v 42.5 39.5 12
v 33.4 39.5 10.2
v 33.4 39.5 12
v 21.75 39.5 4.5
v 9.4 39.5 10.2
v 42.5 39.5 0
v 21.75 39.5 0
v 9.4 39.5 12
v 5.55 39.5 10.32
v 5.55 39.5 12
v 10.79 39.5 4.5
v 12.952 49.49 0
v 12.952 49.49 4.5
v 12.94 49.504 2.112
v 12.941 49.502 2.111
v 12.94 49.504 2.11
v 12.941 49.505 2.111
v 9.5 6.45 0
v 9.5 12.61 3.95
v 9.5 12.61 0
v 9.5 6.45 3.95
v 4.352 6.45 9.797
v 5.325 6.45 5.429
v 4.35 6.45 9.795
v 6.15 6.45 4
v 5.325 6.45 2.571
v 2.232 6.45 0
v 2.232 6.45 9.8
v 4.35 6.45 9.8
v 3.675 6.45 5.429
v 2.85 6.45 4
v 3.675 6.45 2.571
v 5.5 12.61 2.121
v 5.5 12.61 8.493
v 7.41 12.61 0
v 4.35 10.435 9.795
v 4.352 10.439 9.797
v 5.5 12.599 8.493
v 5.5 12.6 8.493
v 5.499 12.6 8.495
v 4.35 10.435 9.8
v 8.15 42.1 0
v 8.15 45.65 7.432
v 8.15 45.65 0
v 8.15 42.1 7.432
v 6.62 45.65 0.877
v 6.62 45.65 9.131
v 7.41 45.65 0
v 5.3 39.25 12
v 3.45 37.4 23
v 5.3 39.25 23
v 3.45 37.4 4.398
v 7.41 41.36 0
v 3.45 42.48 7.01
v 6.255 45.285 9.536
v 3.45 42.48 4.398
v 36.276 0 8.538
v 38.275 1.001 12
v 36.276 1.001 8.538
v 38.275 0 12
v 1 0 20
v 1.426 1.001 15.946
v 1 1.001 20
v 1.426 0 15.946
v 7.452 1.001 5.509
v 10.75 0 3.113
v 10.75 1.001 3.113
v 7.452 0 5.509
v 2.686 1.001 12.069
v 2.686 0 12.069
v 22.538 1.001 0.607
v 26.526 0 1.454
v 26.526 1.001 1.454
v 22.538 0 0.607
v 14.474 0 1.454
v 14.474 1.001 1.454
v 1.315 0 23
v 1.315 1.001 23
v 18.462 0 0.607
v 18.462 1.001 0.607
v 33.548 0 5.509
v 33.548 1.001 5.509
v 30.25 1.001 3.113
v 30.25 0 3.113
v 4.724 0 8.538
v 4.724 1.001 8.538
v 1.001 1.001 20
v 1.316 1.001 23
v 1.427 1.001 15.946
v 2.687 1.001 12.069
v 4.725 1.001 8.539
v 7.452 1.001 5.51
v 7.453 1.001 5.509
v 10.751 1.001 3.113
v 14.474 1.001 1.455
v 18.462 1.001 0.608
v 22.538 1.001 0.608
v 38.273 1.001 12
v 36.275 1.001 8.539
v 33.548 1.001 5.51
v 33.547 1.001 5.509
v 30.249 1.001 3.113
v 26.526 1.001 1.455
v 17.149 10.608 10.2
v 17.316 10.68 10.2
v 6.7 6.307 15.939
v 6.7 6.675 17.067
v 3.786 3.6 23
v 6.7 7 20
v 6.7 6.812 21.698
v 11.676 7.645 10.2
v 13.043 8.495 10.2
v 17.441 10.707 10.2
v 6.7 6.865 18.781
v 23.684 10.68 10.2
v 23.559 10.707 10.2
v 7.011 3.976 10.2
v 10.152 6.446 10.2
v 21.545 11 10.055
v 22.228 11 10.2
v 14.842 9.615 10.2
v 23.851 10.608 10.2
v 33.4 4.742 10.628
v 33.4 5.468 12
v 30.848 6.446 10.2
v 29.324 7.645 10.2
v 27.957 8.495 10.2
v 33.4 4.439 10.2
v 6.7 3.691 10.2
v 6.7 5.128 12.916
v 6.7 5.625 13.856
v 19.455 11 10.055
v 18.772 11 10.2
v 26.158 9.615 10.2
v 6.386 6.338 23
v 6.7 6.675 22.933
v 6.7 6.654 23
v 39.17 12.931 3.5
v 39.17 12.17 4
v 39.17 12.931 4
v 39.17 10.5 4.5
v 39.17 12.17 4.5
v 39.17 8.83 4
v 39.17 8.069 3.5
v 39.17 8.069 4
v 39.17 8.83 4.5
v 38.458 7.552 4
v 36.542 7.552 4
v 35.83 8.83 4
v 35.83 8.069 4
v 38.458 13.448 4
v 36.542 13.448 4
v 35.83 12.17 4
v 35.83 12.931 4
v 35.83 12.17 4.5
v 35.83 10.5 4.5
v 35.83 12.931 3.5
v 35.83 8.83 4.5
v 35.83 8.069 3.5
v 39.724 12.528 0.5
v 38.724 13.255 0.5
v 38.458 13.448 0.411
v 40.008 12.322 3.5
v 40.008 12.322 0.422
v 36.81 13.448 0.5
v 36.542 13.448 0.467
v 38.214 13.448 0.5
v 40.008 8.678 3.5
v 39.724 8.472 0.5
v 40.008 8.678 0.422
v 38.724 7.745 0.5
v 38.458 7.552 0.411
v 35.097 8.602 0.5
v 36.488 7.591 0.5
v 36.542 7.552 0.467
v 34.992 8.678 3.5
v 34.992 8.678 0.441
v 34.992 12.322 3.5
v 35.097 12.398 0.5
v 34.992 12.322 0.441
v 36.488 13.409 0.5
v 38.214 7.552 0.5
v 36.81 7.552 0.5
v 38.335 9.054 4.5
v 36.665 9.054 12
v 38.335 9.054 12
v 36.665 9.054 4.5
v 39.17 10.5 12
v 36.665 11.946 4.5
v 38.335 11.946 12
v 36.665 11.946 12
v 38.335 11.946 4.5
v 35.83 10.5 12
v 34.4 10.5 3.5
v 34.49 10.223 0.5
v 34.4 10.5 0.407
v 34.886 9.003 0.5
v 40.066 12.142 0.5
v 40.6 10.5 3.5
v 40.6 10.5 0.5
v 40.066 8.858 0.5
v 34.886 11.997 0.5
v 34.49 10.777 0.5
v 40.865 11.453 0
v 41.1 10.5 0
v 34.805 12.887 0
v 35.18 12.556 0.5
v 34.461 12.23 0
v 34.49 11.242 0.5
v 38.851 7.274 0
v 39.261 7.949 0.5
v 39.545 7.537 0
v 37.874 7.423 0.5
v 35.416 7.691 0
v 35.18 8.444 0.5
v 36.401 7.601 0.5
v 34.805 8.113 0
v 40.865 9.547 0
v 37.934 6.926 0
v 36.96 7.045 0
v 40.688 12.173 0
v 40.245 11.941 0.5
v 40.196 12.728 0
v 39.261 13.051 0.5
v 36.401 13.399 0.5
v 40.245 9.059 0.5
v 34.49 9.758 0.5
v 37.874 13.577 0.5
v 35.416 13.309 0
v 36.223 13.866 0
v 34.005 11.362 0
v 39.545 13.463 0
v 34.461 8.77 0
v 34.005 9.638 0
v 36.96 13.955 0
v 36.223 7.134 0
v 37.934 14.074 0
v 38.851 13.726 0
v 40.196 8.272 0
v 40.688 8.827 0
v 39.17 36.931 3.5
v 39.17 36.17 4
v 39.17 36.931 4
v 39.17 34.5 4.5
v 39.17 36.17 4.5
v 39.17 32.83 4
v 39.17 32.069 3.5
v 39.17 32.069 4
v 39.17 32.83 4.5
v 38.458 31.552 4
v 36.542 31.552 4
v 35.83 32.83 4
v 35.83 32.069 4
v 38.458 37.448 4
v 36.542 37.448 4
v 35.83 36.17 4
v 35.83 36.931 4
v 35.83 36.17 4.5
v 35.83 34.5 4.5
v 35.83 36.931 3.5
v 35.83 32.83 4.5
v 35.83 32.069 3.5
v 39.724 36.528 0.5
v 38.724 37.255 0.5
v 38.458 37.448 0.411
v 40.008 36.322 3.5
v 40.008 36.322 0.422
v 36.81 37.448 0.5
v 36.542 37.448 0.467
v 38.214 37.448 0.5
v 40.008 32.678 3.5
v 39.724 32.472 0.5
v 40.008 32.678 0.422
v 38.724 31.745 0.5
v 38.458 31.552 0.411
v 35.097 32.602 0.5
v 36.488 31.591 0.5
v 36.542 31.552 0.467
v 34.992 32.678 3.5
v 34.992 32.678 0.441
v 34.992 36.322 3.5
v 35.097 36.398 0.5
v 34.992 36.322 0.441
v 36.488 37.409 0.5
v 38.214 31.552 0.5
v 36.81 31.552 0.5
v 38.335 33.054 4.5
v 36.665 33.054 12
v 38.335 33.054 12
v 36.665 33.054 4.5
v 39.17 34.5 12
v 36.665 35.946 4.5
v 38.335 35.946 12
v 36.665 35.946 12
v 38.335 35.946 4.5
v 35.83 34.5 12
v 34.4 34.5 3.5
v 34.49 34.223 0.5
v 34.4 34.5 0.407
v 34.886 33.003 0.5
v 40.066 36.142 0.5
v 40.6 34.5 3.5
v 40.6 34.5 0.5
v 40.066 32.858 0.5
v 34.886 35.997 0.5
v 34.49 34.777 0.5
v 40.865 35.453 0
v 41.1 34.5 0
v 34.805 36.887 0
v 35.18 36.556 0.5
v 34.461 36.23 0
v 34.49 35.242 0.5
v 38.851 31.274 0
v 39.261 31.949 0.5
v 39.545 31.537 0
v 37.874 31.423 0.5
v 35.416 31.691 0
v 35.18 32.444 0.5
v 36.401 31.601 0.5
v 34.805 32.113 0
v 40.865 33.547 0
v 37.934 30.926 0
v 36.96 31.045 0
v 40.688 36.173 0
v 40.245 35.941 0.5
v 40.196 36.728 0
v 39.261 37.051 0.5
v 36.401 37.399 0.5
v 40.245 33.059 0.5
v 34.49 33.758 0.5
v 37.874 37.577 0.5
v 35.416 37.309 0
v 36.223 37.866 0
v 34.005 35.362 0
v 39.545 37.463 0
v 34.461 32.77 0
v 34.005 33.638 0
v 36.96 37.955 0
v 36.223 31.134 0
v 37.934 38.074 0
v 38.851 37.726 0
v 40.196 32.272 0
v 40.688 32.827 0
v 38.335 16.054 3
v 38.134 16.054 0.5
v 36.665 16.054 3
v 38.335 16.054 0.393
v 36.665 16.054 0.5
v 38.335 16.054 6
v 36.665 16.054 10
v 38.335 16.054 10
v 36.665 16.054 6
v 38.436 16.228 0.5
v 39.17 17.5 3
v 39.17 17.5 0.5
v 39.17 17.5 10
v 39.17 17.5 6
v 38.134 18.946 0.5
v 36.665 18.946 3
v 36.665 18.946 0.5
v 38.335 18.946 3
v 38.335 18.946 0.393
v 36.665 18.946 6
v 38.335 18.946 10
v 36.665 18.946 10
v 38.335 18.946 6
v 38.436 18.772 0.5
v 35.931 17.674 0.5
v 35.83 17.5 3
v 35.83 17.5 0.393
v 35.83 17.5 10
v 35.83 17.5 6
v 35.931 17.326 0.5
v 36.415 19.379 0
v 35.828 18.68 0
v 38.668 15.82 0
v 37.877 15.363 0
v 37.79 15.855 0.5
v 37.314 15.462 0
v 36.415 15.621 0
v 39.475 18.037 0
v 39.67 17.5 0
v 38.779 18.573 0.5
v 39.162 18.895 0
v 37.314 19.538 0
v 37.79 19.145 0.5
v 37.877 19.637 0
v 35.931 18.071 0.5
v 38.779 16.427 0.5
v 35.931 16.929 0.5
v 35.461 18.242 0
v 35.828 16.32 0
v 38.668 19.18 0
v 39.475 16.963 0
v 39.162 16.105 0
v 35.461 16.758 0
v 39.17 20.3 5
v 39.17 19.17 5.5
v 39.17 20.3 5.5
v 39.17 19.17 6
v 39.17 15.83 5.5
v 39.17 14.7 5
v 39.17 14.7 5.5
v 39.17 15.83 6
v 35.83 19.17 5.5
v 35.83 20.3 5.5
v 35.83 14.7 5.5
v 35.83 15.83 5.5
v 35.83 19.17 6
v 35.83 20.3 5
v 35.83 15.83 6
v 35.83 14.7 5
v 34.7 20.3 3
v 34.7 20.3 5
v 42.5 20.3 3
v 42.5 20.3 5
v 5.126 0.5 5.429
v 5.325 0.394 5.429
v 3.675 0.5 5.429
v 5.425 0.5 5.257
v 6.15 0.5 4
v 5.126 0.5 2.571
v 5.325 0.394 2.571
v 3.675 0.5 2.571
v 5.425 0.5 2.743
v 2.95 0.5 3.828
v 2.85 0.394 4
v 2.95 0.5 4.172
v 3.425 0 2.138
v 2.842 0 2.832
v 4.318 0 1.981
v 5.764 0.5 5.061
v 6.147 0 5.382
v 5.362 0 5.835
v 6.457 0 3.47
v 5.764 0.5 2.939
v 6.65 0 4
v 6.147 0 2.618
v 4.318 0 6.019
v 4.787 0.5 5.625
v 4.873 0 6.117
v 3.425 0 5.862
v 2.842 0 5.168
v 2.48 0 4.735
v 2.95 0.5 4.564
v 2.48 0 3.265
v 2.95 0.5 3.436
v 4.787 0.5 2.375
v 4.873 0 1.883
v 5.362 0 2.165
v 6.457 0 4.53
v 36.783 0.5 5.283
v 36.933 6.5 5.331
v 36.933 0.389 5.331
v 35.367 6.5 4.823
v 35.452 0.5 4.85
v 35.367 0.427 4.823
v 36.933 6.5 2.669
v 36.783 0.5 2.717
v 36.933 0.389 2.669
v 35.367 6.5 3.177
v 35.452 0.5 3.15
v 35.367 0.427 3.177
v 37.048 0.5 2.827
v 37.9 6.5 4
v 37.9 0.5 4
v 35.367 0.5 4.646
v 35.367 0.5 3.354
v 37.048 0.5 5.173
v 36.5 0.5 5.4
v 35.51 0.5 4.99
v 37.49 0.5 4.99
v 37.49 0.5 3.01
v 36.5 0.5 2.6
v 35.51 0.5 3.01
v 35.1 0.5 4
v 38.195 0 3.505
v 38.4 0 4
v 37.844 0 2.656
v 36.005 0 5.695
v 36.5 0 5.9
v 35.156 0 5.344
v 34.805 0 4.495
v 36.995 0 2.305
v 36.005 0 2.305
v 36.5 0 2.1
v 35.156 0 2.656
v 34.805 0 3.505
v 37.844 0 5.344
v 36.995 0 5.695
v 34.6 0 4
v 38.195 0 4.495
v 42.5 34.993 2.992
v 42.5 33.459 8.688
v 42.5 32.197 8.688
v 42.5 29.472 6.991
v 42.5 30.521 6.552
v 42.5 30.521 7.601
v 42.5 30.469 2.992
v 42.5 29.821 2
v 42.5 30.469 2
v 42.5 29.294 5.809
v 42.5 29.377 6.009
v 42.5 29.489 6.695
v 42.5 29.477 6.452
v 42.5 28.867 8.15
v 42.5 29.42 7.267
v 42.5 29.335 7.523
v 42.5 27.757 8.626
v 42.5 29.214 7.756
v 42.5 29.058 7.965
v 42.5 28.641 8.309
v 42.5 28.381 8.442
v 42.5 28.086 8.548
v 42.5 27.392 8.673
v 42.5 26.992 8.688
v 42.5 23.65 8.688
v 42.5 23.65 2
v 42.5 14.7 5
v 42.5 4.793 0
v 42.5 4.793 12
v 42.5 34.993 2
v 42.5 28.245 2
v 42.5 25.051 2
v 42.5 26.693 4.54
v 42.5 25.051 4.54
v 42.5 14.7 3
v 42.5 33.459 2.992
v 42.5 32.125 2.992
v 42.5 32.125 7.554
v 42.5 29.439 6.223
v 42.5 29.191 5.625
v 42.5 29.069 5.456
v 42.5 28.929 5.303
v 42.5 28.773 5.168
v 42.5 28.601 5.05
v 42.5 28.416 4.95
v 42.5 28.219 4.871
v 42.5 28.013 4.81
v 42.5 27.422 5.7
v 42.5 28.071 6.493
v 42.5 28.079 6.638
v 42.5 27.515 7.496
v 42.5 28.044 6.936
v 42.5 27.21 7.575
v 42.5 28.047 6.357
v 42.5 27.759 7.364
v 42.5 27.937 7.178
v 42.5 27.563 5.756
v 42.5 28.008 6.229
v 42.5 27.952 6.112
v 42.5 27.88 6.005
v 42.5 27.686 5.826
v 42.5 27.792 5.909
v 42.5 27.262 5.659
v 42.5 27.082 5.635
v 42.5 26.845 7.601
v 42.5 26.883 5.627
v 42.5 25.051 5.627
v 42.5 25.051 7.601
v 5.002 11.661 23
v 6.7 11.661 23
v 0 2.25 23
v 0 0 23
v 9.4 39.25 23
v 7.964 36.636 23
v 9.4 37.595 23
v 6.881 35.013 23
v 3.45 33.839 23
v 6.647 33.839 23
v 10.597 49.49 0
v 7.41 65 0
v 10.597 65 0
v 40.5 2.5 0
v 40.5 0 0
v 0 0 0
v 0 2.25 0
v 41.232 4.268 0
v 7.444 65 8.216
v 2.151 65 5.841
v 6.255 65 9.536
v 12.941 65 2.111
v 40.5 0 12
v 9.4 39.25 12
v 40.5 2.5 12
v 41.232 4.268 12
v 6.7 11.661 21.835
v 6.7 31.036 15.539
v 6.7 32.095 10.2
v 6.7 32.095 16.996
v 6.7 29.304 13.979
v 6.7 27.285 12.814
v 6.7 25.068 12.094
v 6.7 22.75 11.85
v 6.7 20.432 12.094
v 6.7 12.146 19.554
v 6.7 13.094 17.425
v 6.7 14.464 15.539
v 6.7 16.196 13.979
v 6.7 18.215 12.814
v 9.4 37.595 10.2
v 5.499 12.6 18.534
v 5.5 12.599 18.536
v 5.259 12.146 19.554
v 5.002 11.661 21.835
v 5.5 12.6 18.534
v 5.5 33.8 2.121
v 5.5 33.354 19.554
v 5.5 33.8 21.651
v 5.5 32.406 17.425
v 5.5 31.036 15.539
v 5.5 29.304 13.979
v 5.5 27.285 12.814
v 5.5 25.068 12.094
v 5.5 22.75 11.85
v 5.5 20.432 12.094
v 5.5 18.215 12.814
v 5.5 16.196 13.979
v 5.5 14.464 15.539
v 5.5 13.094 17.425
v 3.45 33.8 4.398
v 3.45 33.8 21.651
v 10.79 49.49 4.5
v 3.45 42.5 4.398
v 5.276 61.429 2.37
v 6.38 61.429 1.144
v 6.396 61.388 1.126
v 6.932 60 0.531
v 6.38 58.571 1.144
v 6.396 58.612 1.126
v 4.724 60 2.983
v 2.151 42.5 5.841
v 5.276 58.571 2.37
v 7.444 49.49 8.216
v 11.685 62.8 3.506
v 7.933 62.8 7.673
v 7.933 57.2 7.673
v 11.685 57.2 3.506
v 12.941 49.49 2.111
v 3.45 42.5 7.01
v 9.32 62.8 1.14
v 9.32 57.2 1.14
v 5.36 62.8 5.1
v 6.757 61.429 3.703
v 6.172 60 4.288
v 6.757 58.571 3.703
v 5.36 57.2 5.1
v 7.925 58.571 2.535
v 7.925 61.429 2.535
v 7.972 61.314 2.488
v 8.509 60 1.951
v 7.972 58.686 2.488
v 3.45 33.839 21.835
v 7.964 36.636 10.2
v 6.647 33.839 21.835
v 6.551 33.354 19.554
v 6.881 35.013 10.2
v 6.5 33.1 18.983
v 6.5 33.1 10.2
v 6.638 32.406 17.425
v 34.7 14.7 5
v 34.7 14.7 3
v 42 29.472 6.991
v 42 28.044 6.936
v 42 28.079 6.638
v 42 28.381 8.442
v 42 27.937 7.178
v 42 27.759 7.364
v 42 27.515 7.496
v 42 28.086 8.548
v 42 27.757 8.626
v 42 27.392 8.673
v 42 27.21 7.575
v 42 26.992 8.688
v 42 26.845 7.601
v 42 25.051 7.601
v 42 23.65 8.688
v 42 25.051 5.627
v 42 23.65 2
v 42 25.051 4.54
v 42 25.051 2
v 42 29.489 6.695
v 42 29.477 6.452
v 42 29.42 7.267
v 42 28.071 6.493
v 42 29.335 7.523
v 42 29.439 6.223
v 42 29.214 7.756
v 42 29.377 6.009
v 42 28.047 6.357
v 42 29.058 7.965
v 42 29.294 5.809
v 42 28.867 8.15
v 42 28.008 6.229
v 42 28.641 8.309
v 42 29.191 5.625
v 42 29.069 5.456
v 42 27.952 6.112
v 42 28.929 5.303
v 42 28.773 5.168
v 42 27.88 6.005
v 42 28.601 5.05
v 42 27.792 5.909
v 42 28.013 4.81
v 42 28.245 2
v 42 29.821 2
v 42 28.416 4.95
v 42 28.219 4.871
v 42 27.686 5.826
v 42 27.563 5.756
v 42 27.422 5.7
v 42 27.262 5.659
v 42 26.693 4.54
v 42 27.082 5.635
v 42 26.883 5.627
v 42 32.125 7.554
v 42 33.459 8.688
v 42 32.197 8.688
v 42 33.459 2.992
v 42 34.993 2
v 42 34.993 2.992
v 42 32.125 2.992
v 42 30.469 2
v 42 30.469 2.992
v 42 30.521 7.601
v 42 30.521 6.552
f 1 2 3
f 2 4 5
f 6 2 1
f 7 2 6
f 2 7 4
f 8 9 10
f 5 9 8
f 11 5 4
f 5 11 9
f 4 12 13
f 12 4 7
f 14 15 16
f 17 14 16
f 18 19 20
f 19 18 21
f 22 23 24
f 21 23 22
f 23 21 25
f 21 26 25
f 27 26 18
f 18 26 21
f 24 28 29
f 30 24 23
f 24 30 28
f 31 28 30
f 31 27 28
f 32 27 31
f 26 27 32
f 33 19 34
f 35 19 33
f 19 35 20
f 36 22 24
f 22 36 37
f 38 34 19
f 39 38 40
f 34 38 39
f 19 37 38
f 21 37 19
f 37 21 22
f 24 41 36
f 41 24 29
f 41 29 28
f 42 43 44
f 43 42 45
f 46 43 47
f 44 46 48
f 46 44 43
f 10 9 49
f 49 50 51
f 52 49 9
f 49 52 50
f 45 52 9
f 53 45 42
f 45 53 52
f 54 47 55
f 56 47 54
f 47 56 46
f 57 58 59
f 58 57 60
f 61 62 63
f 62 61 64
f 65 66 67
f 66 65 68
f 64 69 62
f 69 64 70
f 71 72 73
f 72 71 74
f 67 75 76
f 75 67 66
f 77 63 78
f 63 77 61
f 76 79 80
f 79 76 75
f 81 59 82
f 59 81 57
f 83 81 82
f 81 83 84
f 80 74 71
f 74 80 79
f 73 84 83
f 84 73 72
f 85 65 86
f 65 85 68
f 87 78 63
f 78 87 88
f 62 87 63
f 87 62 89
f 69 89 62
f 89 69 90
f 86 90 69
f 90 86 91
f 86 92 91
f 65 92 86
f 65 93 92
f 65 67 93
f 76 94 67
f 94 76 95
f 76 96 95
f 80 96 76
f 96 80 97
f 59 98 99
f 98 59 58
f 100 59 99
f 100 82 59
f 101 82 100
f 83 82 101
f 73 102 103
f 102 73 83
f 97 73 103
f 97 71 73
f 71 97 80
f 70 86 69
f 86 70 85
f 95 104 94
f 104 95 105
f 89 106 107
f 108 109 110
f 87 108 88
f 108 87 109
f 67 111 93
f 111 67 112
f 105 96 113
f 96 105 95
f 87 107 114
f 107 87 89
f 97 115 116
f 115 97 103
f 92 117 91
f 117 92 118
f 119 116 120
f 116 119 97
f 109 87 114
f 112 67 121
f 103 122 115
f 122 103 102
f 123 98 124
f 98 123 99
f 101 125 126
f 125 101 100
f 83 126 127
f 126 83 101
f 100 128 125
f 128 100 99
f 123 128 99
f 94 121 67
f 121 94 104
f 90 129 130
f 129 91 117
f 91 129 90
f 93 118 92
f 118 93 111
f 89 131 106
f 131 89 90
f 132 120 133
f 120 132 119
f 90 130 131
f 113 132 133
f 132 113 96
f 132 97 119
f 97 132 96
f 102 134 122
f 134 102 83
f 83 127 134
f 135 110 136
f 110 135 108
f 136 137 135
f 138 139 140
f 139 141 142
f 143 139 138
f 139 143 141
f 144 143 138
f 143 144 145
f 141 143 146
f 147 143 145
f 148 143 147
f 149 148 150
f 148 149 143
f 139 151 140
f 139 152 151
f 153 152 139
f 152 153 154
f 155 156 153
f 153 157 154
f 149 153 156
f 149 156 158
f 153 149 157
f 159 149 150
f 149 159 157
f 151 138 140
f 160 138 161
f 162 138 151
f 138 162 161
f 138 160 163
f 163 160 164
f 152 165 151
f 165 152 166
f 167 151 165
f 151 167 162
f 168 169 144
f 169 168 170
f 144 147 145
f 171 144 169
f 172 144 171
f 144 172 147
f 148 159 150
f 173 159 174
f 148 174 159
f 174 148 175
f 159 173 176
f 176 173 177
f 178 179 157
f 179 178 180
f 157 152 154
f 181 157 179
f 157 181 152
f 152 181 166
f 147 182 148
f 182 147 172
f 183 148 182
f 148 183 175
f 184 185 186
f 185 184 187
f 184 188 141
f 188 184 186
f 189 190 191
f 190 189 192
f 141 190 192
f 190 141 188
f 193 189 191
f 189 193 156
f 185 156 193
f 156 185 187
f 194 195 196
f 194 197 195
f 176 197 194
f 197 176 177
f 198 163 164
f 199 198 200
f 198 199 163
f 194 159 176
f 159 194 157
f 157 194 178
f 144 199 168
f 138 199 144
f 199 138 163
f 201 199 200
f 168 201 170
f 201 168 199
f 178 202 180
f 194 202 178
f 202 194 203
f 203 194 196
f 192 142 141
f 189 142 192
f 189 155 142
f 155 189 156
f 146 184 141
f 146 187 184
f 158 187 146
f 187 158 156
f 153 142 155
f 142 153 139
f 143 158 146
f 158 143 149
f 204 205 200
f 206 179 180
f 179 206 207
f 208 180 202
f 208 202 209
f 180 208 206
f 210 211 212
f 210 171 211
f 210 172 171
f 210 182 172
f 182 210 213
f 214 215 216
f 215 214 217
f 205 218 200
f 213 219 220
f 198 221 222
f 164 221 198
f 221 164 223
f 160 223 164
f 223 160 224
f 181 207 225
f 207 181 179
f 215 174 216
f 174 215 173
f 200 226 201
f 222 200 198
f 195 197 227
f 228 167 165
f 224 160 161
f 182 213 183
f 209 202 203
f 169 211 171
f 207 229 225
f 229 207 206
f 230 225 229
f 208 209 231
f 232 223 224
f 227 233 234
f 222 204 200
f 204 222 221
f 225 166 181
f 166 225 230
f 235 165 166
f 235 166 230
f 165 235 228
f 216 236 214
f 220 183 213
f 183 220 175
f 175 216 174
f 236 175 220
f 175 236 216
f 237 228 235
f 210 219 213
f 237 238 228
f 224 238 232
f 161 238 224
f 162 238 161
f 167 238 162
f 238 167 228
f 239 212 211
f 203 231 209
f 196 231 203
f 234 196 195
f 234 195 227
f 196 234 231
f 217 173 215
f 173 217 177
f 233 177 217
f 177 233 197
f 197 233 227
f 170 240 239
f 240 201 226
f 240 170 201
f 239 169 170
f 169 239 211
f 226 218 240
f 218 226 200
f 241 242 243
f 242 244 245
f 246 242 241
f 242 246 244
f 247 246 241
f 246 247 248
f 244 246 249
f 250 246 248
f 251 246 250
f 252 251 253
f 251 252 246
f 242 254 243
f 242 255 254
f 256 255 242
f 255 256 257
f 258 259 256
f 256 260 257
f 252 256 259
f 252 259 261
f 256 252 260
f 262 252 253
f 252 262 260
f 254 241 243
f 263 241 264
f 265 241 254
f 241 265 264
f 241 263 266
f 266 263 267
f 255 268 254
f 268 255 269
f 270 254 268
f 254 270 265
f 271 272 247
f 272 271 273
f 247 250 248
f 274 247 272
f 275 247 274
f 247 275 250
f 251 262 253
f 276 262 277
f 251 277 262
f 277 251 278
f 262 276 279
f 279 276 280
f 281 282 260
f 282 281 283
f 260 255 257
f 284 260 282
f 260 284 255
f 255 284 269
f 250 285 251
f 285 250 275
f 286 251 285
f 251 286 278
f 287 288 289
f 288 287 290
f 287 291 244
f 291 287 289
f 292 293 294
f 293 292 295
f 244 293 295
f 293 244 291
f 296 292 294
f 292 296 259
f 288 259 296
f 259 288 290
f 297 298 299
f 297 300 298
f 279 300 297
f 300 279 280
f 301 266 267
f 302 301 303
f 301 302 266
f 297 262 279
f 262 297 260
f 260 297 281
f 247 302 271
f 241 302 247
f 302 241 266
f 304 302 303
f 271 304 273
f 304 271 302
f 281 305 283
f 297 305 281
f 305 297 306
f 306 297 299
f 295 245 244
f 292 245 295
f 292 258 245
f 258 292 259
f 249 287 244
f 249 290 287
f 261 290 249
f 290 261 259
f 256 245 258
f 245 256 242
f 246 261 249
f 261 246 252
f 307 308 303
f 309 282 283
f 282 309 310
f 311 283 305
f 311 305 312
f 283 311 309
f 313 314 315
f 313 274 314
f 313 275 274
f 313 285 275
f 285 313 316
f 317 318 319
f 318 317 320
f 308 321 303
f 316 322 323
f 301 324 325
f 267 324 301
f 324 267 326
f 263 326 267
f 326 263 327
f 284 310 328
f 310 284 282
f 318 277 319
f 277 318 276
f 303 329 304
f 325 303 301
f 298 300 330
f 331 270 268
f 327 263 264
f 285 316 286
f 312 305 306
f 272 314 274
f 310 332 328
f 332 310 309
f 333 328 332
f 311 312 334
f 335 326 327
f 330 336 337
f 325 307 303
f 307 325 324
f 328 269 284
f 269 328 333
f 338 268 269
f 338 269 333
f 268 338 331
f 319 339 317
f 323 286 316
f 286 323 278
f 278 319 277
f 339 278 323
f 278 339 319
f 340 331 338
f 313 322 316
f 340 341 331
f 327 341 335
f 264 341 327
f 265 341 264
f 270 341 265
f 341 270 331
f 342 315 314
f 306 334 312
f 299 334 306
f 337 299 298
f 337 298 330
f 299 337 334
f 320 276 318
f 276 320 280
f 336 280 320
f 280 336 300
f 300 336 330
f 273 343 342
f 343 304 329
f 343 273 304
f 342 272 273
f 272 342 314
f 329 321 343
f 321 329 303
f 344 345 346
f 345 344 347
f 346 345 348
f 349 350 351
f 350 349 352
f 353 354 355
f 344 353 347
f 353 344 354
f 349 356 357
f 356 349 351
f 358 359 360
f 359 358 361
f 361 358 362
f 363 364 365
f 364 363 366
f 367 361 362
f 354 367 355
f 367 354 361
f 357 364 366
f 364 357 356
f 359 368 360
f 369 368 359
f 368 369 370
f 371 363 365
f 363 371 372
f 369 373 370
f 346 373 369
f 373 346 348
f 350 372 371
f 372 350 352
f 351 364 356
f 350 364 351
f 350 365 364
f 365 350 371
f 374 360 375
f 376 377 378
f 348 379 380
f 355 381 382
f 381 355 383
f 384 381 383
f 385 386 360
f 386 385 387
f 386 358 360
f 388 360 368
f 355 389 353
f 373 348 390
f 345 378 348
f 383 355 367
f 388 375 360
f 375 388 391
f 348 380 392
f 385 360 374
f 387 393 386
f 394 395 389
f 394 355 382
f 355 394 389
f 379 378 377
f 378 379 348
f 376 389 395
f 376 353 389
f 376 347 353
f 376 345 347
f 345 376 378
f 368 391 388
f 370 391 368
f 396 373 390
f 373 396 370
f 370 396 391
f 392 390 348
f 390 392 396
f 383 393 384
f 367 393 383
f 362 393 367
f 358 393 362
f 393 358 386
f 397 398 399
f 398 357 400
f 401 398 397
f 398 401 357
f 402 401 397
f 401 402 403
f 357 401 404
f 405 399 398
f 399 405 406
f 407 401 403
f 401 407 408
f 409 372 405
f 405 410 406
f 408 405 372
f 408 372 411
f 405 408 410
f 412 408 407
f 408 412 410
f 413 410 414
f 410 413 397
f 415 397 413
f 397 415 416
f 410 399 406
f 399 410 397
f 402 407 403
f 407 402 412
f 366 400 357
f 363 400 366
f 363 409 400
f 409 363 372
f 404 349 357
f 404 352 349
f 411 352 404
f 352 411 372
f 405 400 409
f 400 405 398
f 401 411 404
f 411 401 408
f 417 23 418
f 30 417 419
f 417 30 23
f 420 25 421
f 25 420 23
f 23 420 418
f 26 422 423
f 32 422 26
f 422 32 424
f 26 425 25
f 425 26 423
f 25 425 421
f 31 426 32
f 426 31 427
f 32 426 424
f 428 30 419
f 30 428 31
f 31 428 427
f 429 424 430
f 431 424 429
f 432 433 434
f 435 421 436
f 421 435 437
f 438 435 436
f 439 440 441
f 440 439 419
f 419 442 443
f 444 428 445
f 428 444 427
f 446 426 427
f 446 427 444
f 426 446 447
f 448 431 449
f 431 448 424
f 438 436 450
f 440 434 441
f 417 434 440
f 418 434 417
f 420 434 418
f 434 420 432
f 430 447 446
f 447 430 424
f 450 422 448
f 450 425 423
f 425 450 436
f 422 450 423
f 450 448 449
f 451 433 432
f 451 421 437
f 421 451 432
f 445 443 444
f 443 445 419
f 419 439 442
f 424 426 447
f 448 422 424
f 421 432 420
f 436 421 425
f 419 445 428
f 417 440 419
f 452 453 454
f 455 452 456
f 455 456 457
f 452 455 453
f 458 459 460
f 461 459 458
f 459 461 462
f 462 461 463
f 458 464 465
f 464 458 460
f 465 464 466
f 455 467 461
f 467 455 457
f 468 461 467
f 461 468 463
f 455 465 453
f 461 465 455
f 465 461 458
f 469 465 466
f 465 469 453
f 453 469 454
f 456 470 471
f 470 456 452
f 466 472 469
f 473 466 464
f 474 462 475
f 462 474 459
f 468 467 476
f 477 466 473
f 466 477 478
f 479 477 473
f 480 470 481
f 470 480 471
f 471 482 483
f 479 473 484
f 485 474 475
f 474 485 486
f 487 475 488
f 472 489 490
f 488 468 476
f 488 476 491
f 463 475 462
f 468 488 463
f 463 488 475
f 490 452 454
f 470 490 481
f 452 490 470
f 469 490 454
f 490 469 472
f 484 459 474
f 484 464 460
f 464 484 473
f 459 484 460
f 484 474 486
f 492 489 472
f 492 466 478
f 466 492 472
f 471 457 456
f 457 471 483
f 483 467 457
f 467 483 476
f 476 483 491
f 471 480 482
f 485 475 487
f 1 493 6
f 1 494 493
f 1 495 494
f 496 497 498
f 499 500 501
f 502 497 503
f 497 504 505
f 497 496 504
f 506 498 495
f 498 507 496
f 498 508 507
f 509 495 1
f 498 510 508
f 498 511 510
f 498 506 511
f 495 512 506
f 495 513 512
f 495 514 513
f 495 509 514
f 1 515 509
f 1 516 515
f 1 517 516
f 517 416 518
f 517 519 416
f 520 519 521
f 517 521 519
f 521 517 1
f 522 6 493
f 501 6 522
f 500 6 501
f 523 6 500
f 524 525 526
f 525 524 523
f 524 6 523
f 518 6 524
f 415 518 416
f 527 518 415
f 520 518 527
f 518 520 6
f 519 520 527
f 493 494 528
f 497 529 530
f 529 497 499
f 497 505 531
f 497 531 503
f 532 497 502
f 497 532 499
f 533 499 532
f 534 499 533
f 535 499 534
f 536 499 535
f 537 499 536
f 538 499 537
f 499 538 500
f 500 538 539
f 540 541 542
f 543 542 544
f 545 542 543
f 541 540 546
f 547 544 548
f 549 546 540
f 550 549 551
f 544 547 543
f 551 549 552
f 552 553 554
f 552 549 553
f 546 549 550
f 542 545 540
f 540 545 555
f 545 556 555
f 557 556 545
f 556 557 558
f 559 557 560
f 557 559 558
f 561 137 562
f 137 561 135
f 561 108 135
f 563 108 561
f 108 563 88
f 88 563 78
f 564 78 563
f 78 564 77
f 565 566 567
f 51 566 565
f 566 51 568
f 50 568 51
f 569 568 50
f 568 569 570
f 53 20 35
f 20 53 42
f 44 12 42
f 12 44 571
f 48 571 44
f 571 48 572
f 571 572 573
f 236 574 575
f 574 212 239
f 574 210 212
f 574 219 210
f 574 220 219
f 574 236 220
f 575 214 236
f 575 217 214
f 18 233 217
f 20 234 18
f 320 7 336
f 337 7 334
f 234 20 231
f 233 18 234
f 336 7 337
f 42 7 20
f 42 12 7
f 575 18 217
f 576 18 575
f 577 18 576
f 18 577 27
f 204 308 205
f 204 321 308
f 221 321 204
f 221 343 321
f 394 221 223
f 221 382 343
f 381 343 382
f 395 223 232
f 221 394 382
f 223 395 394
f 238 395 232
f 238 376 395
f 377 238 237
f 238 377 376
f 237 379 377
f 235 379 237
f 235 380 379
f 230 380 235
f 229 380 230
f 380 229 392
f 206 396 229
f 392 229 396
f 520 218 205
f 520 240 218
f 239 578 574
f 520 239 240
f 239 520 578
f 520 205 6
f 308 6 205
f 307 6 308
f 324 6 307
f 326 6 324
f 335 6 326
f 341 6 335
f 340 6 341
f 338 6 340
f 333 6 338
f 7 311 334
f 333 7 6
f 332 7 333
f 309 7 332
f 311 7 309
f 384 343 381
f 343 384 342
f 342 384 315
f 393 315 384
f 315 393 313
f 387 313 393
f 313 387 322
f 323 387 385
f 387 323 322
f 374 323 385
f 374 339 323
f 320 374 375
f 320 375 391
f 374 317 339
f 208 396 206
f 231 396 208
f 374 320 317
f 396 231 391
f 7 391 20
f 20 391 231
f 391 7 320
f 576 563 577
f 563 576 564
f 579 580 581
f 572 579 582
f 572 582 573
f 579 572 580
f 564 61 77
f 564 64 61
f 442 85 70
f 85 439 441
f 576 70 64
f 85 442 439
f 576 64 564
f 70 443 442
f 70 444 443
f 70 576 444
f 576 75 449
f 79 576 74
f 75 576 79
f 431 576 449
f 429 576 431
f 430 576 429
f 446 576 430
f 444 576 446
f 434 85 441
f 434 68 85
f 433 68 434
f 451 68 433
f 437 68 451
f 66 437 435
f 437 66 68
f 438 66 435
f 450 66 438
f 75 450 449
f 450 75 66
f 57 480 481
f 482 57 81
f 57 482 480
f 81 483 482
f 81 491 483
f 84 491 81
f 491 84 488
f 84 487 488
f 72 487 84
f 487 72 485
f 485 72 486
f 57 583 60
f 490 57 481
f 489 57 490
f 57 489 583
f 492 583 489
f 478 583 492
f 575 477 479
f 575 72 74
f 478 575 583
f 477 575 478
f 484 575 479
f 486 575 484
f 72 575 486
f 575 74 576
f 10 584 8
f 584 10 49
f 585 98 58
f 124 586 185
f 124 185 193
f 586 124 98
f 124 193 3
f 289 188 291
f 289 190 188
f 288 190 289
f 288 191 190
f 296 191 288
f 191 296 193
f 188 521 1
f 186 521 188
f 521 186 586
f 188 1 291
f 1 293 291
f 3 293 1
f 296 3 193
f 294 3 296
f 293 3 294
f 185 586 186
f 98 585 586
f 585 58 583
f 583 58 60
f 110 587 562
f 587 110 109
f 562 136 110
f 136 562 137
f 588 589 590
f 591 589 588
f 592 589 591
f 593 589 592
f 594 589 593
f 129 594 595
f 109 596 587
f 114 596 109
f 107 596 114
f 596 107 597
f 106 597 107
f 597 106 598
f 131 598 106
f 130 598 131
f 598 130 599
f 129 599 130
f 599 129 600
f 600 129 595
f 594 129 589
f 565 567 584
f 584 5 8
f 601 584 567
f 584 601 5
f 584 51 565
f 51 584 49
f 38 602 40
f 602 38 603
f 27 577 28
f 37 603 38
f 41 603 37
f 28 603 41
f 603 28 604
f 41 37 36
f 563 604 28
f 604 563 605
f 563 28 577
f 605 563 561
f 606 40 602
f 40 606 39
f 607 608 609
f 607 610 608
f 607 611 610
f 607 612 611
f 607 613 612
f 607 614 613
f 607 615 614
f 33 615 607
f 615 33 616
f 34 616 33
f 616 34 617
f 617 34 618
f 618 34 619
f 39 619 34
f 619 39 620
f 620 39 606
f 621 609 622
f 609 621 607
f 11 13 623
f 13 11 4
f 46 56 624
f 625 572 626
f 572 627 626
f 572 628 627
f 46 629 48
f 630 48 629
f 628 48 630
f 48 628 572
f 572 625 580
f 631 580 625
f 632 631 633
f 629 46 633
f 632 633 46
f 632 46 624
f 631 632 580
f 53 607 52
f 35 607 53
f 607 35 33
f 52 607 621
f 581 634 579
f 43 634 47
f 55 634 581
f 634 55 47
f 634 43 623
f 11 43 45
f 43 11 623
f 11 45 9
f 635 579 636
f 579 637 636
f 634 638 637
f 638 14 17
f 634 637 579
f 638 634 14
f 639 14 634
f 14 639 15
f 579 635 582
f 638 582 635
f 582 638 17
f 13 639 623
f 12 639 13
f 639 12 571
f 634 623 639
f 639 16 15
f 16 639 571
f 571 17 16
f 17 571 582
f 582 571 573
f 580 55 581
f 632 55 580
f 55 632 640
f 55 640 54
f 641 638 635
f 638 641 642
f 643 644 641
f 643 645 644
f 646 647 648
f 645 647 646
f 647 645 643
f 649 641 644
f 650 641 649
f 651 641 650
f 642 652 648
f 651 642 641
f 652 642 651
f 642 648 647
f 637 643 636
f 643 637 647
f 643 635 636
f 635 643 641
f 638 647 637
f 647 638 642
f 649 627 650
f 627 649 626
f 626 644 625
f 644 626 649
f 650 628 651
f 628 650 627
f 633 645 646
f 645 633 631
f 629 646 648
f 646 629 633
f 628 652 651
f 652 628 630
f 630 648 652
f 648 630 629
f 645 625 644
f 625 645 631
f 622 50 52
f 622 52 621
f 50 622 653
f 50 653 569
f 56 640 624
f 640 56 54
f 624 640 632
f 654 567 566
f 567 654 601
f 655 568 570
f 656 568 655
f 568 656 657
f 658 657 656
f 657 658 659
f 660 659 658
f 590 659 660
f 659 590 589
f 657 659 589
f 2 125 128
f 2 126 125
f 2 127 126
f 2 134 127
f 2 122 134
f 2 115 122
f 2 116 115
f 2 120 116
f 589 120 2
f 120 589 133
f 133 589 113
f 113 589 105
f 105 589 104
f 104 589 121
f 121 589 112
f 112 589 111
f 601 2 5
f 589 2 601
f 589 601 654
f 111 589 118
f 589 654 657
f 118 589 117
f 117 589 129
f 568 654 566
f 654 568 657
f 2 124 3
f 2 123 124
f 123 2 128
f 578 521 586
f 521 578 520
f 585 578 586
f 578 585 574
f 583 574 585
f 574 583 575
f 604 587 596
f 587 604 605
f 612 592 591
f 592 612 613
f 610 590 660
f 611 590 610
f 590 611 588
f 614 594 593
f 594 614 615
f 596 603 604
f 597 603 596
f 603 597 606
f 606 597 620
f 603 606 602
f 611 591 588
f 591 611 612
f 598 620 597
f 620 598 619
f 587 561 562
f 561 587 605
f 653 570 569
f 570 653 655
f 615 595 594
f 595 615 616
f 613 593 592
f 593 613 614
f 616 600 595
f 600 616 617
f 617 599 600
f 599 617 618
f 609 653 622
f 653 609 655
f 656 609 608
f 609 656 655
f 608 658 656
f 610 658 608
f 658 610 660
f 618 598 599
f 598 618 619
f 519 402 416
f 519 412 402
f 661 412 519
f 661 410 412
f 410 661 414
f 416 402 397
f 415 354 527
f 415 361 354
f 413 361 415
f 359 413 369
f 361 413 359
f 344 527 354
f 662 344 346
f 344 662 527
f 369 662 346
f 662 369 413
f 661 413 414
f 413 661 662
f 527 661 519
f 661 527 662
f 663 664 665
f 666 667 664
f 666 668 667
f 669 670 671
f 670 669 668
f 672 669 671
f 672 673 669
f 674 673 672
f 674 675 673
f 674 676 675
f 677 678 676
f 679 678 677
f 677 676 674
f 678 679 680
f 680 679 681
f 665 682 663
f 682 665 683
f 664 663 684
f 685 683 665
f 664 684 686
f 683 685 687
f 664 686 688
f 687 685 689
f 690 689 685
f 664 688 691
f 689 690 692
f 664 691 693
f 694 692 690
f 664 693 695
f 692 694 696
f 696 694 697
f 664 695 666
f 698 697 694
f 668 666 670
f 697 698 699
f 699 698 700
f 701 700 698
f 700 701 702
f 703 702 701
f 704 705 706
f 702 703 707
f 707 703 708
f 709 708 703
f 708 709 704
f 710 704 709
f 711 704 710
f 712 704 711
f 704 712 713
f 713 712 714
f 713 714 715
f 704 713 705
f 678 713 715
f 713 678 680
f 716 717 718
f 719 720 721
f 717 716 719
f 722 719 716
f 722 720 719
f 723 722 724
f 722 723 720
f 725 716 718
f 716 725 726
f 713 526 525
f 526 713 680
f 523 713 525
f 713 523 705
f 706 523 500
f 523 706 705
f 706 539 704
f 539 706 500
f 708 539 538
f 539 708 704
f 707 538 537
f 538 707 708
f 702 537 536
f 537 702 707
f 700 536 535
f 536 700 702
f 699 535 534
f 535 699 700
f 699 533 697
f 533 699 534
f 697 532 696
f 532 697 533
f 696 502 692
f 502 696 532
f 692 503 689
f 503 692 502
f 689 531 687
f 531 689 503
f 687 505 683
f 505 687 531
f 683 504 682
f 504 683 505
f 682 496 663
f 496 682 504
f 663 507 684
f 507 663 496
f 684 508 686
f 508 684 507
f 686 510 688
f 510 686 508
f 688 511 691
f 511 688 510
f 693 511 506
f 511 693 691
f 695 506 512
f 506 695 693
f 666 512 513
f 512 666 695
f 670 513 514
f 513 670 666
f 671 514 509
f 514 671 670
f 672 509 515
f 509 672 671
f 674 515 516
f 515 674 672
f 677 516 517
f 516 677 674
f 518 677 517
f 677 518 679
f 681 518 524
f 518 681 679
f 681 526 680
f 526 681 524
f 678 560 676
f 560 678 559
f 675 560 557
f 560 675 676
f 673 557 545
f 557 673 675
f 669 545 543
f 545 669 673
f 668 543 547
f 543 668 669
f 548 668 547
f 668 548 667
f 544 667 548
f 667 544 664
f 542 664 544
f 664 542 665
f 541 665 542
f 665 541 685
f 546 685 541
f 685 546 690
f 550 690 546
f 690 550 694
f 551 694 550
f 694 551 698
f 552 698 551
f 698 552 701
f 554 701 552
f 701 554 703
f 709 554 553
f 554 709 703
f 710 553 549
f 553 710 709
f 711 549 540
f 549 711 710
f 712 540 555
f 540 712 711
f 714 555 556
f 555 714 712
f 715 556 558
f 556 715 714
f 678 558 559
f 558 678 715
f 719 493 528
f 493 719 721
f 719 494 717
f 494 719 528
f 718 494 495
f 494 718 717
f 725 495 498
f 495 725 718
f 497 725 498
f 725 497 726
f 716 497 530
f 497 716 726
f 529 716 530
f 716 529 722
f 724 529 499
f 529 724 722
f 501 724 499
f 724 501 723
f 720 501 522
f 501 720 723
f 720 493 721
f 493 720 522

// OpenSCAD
// PIRANHA iteration1
// extruder cover
// GNU GPL v3
// Usan Siriwardana <usiriwar@uwaterloo.ca> and contributors
// based on Prusa i3 MK3S
// https://reprap.org/wiki/Prusa_i3_MK3

module mountingHole(){
	// mounting holes
	translate([0, 0, -1/2]){
		// main hole
		cylinder(r = 1.67, h = 25);
		// counterbore
		cylinder(r = 3.1, h = 3.5 + 1/2);
		// stepped hole
		translate([0, 0, 3.5 + 1])cube([1.67*2, 1.67*2, 1], center=true);
		intersection(){
			translate([0, 0, 3.5 + 1/2])cube([1.67*2, 3.1*2, 1], center=true);
			cylinder(r = 3.1, h = 3.5 + 1);
		}
		// chamfer
		cylinder(r1 = 3.1 + 1, r2 = 3.1, h = 1);
	}
}

difference(){
	// base
	cube([42.5, 65, 23]);
	
	// trim
	translate([6.7, -1, 12])cube([50, 33.1 + 1, 20]);
	translate([9.4, -1, 12])cube([50, 70, 20]);
	translate([-1, 39.25, 12])cube([50, 70, 20]);
	
	translate([0, 2.25, -1])rotate([0, 0, 152.01 - 90])cube([11.72, 10, 25]);
	translate([5.5, 12.6, -1])rotate([0, 0, 90])cube([21.2, 10, 25]);
	
	translate([21.75, 39.5, -1]){
		cube([25, 30, 25]);
		rotate([0, 0, 90 - 48.63])cube([25, 13.33, 25]);
	}
	translate([10.79, 39.5, 4.5])cube([10.96, 10, 10]);
	
	// part cooling fan mount
	translate([7.41, 12, 0])rotate([0, -90 - (90-48), 0])cube([20, 70, 10]);
	translate([10.79, 39.5, 4.5])rotate([0, -(90-48), 0])cube([10, 70, 20]);
	translate([10.79, 49.5 - 0.01, 4.5])rotate([0, -(90-48), 0])translate([0, 0, -15])cube([15, 70, 20]);
	translate([12.94, 49.5 - 0.01, 2.11])rotate([0, -(90-48) + 90, 0])translate([0, 0, -15])cube([15, 70, 20]);
	translate([2.55, 42.24, 6.2])rotate([0, -(90-48), 0])translate([-1, 0, 0])cube([15, 70, 20]);
	// square nut
	translate([7.34, 60, 3.12]){
		rotate([0, 45, 0])translate([0, 0, 10/2])cube([5.6, 5.6, 10], center = true);
	}
	
	
	// towards heatsink fan side slot
	translate([9.5, 6.45, 3.95]){
		rotate([0, 180, 0])cube([10, 6.16, 10]);
		rotate([0, 180 + (90-41.36), 0])cube([7.79, 6.16, 10]);
		translate([-5.15, 0, 5.85])rotate([0, 180, 0])cube([10, 6.16, 10]);
	}
	translate([5.72, 60, 1.66])rotate([0, -(90-48) + 90, 0])translate([0, 0, -1])cylinder(r = 1.65, h = 40);
	// far from heatsink fan side slot	
	translate([8.15, 42.1, -1]){
		rotate([0, 0, 90])cube([3.55, 1.53, 10]);
		rotate([0, 0, 90 + 45])cube([3.55, 15, 50]);
		translate([-1.53, 3.55, 0])rotate([0, 0, -90 -45])cube([5, 2, 50]);
		translate([-1.53, 3.55, 0])rotate([0, 0, -90])cube([1.53, 1, 50]);
	}
	translate([3.45, 42.5, 0]){
		rotate([0, 0, 180])cube([10, 10, 50]);
	}
	// internal radius for some reason
	translate([11.5, 33.1, 23-12.8])cylinder(r=5, h=12.8 + 0.1);
	
	// heatsink space
	translate([11.7-5, 0, 10.2])cube([24, 33.1, 3]);
	translate([11.7-2.3, 0, 10.2])cube([24, 40, 3]);
	
	// heatsink fan port
	union(){
		translate([20.5, -1, 20])rotate([270, 0, 0])cylinder(r = 19.5, h = 2 + 0.001);
		translate([20.5, 1, 20])rotate([270, 0, 0])cylinder(r1 = 19.5, r2 = 10, h = 10);
	}
	
	// heatsink fan cable cutout
	translate([43, 2.5, -1])cylinder(r = 2.5, h = 25);
	translate([43 - 2.5, -2.5, -1])cube([5, 5, 25]);
	
	// cutout for hotend
	translate([-1, 22.75, 23])rotate([0, 90, 0])cylinder(r = 11.15, h = 28 + 1);
	
	// mounting holes
	translate([37.5, 10.5, 0]){
		mountingHole();
	}
	translate([37.5, 10.5 + 24, 0]){
		mountingHole();
	}
	translate([37.5, 10.5 + 7, -1/2]){
		cylinder(r = 1.67, h = 10 + 1/2);
		cylinder(r1 = 1.67 + 1, r2 = 1.67, h = 1);
		translate([0, 0, 5 + 1/2])cube([1.67*2, 5.6, 1], center=true);
		translate([0, 0, 5 + 1])cube([1.67*2, 1.67*2, 1], center=true);
	}
	translate([34.7, 14.7, 3]){
		cube([8, 5.6, 2]);
	}
	
	// fan mounting holes
	translate([4.5, -1/2, 4])rotate([-90, 0, 0]){
		// larger hole, screw passes through and bites into part cooling fan duct
		cylinder(r = 1.65, h = 6.5 + 1/2);
		cylinder(r1 = 1.65 + 1, r2 = 1.65, h = 1);
	}
	translate([4.5 + 32, -1/2, 4])rotate([-90, 0, 0]){
		// smaller hole for threads to bite
		cylinder(r = 1.4, h = 6.5 + 1/2);
		cylinder(r1 = 1.4 + 1, r2 = 1.4, h = 1);
	}
	
	// version number
	translate([42.5 - 0.5, 23, 2])rotate([90, 0, 90])linear_extrude(height = 1)text("R1", font = "helvetica:style=bold", size = 7);
}
